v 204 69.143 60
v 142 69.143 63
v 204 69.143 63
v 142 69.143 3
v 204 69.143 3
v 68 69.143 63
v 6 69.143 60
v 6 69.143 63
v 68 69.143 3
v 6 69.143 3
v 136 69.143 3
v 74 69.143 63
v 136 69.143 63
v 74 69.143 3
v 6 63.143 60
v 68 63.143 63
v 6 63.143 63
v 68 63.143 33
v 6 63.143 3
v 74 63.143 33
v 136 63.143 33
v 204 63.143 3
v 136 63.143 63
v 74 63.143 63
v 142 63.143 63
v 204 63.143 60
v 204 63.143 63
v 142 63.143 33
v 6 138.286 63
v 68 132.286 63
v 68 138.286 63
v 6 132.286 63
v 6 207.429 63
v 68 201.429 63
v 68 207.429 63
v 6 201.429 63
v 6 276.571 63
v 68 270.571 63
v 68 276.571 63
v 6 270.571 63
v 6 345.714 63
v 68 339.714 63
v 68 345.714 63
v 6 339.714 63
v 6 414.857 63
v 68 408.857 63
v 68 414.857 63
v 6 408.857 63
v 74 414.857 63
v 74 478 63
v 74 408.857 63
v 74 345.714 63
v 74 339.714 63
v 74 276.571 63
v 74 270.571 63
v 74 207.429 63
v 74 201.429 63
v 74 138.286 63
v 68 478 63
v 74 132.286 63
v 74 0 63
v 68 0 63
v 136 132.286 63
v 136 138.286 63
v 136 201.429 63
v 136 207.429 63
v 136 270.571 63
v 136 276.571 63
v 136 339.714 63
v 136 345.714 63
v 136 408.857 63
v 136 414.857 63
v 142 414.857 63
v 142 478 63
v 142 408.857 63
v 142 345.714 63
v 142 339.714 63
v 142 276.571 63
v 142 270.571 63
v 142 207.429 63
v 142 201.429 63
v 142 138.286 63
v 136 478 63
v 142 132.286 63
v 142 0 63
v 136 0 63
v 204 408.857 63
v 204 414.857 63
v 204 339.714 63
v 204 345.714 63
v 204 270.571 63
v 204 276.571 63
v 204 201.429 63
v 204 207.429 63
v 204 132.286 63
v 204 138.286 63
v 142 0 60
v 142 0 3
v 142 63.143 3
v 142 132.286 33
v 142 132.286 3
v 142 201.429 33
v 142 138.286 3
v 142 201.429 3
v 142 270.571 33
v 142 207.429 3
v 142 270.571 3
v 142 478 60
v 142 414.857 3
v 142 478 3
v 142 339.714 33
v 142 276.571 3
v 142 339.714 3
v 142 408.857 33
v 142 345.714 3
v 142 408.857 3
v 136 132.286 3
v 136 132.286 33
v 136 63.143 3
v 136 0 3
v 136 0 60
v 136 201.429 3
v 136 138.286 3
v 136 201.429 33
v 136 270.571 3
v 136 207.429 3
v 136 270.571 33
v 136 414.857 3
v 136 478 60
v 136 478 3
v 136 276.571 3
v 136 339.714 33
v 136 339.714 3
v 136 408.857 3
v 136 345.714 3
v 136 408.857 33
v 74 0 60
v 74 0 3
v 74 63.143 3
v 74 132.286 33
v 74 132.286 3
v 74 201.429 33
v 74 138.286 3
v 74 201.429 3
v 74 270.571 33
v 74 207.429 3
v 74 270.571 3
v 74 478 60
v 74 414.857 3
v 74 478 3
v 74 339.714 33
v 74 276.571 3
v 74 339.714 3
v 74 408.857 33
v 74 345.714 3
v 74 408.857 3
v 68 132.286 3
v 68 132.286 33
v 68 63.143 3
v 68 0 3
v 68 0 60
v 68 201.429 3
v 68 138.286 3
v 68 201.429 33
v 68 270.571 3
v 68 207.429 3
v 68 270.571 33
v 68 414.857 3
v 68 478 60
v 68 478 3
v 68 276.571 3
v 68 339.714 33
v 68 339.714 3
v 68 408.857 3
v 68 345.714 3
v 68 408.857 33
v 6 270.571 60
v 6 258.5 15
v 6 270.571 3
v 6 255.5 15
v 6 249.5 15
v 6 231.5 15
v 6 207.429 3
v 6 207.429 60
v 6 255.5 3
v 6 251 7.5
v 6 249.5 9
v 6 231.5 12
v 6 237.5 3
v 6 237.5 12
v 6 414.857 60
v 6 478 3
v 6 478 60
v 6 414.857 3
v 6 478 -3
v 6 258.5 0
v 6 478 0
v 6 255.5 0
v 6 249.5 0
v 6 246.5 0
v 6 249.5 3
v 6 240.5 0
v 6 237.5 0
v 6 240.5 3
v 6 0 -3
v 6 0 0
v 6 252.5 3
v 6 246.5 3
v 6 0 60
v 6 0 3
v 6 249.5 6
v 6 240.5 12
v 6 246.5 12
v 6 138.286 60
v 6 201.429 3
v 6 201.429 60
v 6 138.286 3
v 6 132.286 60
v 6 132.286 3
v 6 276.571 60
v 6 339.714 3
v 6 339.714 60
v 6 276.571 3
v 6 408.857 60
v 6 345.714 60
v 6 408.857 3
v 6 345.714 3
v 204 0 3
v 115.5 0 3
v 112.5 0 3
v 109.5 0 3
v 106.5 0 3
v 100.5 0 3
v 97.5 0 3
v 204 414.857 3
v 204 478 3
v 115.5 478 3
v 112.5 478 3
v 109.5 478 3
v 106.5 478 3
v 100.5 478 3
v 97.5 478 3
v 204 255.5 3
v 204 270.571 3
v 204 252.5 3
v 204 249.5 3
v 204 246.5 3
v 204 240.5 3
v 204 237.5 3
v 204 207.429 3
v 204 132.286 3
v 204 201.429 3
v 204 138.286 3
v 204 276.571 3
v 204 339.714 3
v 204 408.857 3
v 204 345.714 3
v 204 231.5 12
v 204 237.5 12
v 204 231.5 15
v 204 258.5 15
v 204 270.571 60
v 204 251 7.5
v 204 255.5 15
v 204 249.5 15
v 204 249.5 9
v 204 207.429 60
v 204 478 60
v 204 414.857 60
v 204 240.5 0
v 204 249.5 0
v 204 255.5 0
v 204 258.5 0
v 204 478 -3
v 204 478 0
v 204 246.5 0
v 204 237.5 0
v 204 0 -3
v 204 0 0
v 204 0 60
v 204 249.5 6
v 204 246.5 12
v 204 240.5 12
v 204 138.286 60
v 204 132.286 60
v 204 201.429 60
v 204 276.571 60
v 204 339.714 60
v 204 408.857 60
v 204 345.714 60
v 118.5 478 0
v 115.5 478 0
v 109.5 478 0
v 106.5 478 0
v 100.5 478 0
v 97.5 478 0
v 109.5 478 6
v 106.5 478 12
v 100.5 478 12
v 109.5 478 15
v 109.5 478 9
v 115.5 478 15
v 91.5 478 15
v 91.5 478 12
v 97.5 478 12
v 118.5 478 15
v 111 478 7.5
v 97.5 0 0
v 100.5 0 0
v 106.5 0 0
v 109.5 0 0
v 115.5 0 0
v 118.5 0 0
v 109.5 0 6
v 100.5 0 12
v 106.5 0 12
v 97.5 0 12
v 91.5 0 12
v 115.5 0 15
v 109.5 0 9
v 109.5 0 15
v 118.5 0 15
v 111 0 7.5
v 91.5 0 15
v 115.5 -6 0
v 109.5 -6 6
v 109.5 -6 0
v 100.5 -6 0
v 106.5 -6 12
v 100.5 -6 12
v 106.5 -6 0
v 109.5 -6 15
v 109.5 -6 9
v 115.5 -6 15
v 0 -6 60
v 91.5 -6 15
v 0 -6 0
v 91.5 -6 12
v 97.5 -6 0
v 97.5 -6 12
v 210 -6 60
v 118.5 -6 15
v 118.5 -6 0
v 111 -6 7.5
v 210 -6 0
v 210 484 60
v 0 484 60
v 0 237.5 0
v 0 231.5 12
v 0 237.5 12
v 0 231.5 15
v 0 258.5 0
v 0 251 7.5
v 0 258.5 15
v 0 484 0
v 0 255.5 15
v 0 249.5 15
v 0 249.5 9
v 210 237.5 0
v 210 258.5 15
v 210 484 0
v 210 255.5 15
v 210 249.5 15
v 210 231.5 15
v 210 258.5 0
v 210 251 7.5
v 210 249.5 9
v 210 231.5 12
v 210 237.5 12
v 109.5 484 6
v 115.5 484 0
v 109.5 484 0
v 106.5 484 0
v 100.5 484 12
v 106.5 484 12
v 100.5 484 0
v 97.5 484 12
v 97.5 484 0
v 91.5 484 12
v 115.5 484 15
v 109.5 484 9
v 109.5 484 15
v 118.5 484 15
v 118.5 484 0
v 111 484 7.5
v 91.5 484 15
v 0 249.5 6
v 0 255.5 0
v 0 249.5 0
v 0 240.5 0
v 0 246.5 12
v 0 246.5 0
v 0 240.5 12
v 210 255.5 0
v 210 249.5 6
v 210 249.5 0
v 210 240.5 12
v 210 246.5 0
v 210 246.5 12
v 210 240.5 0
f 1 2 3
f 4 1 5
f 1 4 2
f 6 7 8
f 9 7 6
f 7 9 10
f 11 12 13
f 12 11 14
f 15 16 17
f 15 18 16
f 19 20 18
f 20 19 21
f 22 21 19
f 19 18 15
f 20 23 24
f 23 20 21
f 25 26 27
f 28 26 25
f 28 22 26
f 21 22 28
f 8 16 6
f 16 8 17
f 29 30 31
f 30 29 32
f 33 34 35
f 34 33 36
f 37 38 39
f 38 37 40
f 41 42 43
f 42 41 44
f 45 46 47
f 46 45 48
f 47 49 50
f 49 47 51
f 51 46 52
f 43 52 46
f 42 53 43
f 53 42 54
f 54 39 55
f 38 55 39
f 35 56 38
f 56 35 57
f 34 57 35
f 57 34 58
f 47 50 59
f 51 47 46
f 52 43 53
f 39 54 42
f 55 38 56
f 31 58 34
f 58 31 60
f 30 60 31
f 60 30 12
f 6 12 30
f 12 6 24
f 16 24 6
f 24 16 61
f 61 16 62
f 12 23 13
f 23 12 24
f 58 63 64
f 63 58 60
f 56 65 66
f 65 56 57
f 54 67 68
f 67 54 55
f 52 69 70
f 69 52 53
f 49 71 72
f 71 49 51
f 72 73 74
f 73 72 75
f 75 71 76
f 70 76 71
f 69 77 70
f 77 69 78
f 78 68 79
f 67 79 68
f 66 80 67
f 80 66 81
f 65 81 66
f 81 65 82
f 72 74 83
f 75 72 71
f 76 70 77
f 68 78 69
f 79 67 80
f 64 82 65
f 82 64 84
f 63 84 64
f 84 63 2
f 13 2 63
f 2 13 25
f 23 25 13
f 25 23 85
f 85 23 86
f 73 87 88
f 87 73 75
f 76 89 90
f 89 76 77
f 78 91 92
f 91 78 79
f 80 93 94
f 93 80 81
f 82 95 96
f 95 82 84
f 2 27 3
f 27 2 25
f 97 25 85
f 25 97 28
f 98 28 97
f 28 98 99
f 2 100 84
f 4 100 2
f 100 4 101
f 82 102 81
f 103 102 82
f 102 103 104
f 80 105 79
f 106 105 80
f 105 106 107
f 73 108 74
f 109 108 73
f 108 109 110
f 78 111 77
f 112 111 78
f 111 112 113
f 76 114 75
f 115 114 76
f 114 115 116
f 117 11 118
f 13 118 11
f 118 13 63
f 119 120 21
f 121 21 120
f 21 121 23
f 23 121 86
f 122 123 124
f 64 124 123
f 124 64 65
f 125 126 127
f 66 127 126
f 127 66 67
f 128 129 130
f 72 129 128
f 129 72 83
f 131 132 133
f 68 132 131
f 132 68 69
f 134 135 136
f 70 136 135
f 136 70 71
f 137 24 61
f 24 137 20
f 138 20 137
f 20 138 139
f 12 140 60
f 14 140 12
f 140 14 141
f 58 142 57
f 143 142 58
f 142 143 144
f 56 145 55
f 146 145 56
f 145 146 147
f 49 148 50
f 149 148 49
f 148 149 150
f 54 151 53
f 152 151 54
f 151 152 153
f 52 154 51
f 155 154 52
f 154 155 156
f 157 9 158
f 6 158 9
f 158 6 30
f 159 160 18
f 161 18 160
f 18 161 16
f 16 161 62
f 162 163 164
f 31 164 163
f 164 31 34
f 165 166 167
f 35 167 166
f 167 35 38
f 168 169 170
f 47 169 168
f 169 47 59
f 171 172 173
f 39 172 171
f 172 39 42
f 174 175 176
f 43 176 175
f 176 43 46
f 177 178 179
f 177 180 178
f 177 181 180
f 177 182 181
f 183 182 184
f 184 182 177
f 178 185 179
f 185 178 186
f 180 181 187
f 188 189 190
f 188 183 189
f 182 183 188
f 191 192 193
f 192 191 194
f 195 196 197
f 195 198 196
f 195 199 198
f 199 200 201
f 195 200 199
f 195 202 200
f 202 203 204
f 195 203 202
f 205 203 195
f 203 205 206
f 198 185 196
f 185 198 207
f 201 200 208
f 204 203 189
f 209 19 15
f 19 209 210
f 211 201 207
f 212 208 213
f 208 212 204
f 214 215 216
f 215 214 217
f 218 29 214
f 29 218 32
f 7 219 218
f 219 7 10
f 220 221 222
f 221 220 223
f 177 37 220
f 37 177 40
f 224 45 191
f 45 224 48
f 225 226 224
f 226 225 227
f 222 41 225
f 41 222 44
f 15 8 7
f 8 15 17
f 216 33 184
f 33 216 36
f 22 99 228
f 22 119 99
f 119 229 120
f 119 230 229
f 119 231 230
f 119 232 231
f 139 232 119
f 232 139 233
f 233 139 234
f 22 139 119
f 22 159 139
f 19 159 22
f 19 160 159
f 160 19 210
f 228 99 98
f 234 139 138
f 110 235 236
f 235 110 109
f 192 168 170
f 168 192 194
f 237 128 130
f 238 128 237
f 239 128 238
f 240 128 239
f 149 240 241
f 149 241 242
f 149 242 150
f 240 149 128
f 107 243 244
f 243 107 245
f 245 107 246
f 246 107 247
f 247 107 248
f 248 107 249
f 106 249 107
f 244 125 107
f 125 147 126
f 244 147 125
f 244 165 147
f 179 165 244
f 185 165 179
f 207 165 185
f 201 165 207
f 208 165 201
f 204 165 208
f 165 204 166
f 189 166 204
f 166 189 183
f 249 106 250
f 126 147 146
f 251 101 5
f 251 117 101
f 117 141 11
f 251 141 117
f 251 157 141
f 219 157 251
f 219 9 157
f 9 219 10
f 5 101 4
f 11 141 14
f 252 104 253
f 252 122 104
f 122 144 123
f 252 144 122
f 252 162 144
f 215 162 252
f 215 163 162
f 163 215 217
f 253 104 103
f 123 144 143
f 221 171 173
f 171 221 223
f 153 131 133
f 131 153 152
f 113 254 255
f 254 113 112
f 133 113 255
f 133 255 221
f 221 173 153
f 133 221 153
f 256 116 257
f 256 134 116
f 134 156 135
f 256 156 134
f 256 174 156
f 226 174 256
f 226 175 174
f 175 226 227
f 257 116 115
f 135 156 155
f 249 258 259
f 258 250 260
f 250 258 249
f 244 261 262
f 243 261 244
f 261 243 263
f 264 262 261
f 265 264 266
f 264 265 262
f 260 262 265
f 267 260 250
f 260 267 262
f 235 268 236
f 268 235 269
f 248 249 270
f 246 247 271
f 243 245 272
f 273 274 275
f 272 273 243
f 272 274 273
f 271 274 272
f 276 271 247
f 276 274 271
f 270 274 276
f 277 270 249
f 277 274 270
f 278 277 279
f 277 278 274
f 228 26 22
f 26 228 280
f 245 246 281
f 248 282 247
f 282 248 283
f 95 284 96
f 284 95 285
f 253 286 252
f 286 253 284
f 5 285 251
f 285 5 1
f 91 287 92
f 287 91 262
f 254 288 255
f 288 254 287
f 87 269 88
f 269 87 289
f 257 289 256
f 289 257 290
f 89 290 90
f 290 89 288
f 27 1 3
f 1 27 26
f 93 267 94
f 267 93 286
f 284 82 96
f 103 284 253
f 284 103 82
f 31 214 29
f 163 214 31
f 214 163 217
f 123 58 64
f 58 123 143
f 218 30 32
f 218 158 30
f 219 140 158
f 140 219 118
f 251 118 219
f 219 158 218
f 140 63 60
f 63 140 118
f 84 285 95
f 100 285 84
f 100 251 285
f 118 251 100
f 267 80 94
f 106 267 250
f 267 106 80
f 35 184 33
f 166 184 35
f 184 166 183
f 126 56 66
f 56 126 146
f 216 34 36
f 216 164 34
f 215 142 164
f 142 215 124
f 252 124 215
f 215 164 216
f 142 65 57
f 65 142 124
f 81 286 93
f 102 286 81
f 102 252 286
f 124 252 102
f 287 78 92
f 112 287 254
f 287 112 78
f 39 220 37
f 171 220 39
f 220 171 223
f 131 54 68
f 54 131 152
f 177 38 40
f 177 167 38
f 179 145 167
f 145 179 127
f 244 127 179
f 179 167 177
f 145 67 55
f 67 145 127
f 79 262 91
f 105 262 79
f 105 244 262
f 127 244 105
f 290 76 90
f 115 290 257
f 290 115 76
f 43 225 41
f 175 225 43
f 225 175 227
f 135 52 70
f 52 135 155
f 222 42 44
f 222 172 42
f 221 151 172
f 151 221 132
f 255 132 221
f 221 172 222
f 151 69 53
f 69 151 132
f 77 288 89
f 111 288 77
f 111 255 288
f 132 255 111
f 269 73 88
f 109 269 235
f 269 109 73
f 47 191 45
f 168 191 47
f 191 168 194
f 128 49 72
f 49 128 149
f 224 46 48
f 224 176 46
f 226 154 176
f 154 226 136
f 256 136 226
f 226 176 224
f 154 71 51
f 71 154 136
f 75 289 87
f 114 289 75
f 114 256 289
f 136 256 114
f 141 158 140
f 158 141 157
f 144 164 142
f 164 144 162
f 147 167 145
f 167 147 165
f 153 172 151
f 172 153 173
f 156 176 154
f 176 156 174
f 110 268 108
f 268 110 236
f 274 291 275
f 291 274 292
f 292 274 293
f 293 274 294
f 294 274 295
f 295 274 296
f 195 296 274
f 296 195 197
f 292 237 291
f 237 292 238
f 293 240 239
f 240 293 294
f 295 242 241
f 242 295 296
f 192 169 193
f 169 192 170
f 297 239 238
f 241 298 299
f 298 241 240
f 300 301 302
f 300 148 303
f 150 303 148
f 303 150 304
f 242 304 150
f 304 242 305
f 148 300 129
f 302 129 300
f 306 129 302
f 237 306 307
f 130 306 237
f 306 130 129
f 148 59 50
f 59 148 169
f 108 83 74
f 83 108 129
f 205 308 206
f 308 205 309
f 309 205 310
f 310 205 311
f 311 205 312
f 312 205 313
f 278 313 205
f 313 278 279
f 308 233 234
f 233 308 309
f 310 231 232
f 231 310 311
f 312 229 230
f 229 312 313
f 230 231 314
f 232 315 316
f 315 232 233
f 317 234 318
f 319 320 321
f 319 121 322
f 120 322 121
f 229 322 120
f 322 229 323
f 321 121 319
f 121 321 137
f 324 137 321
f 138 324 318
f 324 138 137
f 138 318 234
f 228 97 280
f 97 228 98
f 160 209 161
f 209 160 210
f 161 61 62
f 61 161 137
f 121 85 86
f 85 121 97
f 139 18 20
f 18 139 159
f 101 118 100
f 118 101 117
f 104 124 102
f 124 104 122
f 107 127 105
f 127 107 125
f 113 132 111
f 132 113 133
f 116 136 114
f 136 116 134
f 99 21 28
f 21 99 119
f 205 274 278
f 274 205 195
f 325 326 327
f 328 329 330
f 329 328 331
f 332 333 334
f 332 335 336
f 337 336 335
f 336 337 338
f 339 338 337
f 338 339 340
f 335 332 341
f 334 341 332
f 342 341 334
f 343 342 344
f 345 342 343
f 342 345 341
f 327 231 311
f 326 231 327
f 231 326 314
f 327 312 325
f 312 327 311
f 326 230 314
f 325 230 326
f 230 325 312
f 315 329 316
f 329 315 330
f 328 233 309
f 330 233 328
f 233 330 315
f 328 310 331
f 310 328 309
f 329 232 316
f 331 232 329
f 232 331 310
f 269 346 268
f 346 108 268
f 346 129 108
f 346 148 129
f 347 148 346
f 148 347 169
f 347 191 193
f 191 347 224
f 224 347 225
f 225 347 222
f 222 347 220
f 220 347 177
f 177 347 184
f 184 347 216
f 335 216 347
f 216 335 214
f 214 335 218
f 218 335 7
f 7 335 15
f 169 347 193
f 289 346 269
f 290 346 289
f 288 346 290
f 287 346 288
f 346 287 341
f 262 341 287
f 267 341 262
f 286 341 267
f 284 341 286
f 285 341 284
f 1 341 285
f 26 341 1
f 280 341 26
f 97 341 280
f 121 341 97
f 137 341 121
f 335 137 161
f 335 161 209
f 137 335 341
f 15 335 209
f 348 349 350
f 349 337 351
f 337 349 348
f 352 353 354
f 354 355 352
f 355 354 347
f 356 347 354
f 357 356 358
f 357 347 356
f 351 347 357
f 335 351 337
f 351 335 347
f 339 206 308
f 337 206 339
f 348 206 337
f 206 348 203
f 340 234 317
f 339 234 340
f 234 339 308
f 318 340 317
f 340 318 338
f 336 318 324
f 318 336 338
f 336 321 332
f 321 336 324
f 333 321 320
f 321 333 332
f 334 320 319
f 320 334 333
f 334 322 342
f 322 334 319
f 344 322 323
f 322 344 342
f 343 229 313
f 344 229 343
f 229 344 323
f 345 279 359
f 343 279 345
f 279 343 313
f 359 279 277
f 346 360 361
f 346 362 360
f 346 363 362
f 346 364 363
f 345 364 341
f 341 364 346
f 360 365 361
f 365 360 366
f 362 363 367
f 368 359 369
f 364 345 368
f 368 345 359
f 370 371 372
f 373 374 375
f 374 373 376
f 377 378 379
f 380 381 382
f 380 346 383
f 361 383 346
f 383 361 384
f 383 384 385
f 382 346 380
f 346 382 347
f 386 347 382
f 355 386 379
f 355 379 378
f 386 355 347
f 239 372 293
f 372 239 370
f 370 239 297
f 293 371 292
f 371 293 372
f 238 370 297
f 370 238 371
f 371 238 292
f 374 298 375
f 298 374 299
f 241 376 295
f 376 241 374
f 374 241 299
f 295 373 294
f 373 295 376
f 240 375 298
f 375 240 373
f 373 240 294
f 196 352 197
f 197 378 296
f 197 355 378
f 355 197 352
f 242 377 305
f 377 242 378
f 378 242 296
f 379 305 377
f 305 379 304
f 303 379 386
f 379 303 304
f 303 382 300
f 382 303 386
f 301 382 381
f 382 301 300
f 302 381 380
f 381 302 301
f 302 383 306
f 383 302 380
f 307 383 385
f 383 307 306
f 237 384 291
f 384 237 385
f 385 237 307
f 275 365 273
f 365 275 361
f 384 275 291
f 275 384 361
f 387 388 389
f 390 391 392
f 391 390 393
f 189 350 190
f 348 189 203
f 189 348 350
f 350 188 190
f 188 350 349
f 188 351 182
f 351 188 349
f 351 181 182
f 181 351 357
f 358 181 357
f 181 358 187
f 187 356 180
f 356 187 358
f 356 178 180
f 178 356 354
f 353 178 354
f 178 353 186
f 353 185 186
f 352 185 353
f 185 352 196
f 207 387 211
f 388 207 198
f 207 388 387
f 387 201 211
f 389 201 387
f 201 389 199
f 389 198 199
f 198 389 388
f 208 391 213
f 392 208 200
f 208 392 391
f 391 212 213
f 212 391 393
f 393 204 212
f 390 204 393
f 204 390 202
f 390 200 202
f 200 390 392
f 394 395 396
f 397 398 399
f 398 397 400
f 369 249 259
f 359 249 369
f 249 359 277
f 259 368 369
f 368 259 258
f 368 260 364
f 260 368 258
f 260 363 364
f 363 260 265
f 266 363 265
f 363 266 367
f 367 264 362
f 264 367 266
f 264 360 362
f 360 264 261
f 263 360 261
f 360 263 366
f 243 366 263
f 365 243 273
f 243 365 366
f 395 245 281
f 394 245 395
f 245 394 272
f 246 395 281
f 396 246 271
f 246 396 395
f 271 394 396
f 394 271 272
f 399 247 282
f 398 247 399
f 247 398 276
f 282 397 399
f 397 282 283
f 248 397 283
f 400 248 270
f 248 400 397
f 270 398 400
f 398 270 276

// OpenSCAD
thickness = 6;

//square([thickness, thickness]);

//translate([400,0])
//import(file = "GULP box/side.dxf");

//translate([0,-50])
//import(file = "GULP box/bottom.dxf");

// wood = 40 x 70 cm


w = 490;
d = 210;
h = 60;

inter_connecter = 0;
connecter_length = 0;

side_connection_dist = 0;

n_cells_w = 7;
n_cells_d = 3;

h_cell = 60;


h_locker = 0;
w_locker = 0;
a_locker = 0;


laser_dist = 0;





w_in = w - thickness * 2;
h_in = h - thickness * 2;
d_in = d - thickness * 2;

w_cell = (w_in + thickness)/n_cells_w;
d_cell = (d_in + thickness)/n_cells_d;
w_cell_in = w_cell - thickness;
d_cell_in = d_cell - thickness;

echo("inside width of cell =", w_cell_in);
echo("inside depth of cell =", d_cell_in);

module connected_side(length, thickness_multiplier=2) {
    l2 = length-connecter_length - side_connection_dist*2;
    n = floor(l2/inter_connecter) + 1;
    left_over = l2 - (n-1)*inter_connecter;
    if (n > 0)
//        translate([(inter_connecter-(inter_connecter-length % inter_connecter))/2,0])
        translate([left_over/2 + connecter_length/2 + side_connection_dist,0])
        for (i = [0:n - 1])
            translate([i*inter_connecter, 0])
                square([connecter_length, thickness*thickness_multiplier],center=true);
}

module bottom() {
    difference() {
        square([d_in,w_in]);
        for (c = [1:n_cells_w-1])
        {
            translate([0,c*w_cell-thickness/2])
            connected_side(d_in,1);
        }
    }
    connected_side(d_in);
    translate([0,w_in])
    connected_side(d_in);

    rotate([0,0,90])
    connected_side(w_in);
    translate([d_in,0])
    rotate([0,0,90])
    connected_side(w_in);
}

module locker() {
    polygon(points=[[0,0],[0,-h_locker],[w_locker,-h_locker], [w_locker + tan(a_locker)*h_locker,0]]);
}
    


logo_size = min(w_cell_in,h_cell,d_cell_in);

module logo() 
{
    scale(logo_size/10)
    scale(.5)
    translate([-5.5,-1])
    polygon(points=[ [3,1], [3,5], [1,5], [1,6], [7,6], [7,4], [9,6], [10,6], [7.5,3.5], [10,1], [9,1], [7,3], [7,1], [6,1], [6,5], [4,5], [4,1]  ]);
}

module side() {

    difference() {
        union() {
            square([d,h]);
            translate([-side_connection_dist,-h_locker])
            square([side_connection_dist,h]);
            translate([d,-h_locker])
            square([side_connection_dist,h]);
            
            // lockers
            translate([0,0])
            locker();

            translate([d,0])
            scale([-1,1])
            locker();
        }
        
        // cell connections
        for (c = [1:n_cells_d-1])
        {
            translate([c*d_cell+thickness/2,side_connection_dist+thickness/2])
            rotate([0,0,90])
            connected_side(h_cell,1);
        }
        
        if (n_cells_d%2 == 1)
            translate([d/2,h-logo_size])
            logo();
        
        // bottom connection
        translate([thickness, side_connection_dist])
        connected_side(d_in, 1);
        
        //side connections
        translate([thickness/2,-h_locker])
        rotate([0,0,90])
        connected_side(h,1);
            
        translate([d-thickness/2,-h_locker])
        rotate([0,0,90])
        connected_side(h,1);
        
            
        // lockers
        translate([0,h])
        locker();
        
        translate([d,h])
        scale([-1,1])
        locker();
        
    }

}

module front() {
    difference() 
    {
        square([h,w_in]);

        // bottom connection
        translate([h-side_connection_dist,0])
        rotate([0,0,90])
        connected_side(w_in,1);
        
        // cell connections
        for (c = [1:n_cells_w-1])
        {
            translate([(h-h_cell-(side_connection_dist+thickness/2)),c*w_cell-thickness/2])
            connected_side(h_cell,1);
        }
        
                
        if (n_cells_w%2 == 1)
            translate([logo_size,w/2])
            rotate([0,0,90])
            logo();
        
        // lockers
        translate([0,0])
        rotate([0,0,90])
        locker();
            
        translate([0,w_in])
        rotate([0,0,90])
        scale([-1,1])
        locker();
    }
    
    // connections
    translate([h_locker,0])
    connected_side(h);
    translate([h_locker,w_in])
    connected_side(h);
    

    // lockers
    translate([h,0])
    rotate([0,0,90])
    locker();
        
    translate([h,w_in])
    rotate([0,0,90])
    scale([-1,1])
    locker();

}


module cell_separator_w() {
    difference() {
        square([d_in, h_cell]);
        
        for (c = [1:n_cells_d-1])
        {
            translate([c*d_cell-thickness/2,h_cell])
            square([thickness,h_cell],center=true);
        }
    }
    connected_side(d_in);
    
    rotate([0,0,90])
    connected_side(h_cell);
    
    translate([d_in,0])
    rotate([0,0,90])
    connected_side(h_cell);
    

}

module cell_separator_d() {
    difference() {
        square([w_in,h_cell]);    
        
        for (c = [1:n_cells_w-1])
        {
            translate([c*w_cell-thickness/2,0])
            square([thickness,h_cell],center=true);
        }
    }
        
    rotate([0,0,90])
    connected_side(h_cell);
    
    translate([w_in,0])
    rotate([0,0,90])
    connected_side(h_cell);
}



module to_laser_cut() {
    translate([thickness, thickness])
    bottom();

    translate([0,-h-h_locker-laser_dist])
    side();

    translate([0,(-h-h_locker-laser_dist)*2])
    side();

    translate([-h-laser_dist-h_locker,thickness])
    front();

    translate([(-h-laser_dist-h_locker)*2,thickness])
    front();

    for (c = [0:n_cells_w-2])
    {
        translate([thickness,w+thickness+laser_dist+c*(thickness+laser_dist+h_cell)])
        cell_separator_w();
    }

    for (c = [0:n_cells_d-2])
    {
        translate([d+laser_dist+c*(h_cell+laser_dist),w-thickness])
        rotate([0,0,-90])
        cell_separator_d();
    }
}

module box3D() 
{
//    intersection()
    union() 
    {
        translate([thickness,0,side_connection_dist-thickness/2])
        linear_extrude(thickness)
            bottom();

        rotate([90,0,0])
        linear_extrude(thickness)
            side();
        
        translate([0,w-thickness,0])
        rotate([90,0,0])
        linear_extrude(thickness)
            side();
        
        translate([0,0,h])
        rotate([0,90,0])
        linear_extrude(thickness)
            front();   
        
        translate([d-thickness,0,h])
        rotate([0,90,0])
        linear_extrude(thickness)
            front();   
        
        
        for (c = [1:n_cells_w-1])
            translate([thickness,c*w_cell, side_connection_dist+thickness/2])
            rotate([90,0,0])
            linear_extrude(thickness)
                cell_separator_w();
        
        for (c = [1:n_cells_d-1])
            translate([c*d_cell,0,side_connection_dist+thickness/2])
            rotate([90,0,90])
            linear_extrude(thickness)
                cell_separator_d();   
    }
        
}



// for export :

part = -2;

if (part== -2)
    box3D();
else if (part == -1)
    to_laser_cut();
else if (part == 0)
    bottom();
else if (part == 1)
    side();
else if (part == 2)
    front();
else if (part == 3)
    cell_separator_w();
else if (part == 4)
    cell_separator_d();
